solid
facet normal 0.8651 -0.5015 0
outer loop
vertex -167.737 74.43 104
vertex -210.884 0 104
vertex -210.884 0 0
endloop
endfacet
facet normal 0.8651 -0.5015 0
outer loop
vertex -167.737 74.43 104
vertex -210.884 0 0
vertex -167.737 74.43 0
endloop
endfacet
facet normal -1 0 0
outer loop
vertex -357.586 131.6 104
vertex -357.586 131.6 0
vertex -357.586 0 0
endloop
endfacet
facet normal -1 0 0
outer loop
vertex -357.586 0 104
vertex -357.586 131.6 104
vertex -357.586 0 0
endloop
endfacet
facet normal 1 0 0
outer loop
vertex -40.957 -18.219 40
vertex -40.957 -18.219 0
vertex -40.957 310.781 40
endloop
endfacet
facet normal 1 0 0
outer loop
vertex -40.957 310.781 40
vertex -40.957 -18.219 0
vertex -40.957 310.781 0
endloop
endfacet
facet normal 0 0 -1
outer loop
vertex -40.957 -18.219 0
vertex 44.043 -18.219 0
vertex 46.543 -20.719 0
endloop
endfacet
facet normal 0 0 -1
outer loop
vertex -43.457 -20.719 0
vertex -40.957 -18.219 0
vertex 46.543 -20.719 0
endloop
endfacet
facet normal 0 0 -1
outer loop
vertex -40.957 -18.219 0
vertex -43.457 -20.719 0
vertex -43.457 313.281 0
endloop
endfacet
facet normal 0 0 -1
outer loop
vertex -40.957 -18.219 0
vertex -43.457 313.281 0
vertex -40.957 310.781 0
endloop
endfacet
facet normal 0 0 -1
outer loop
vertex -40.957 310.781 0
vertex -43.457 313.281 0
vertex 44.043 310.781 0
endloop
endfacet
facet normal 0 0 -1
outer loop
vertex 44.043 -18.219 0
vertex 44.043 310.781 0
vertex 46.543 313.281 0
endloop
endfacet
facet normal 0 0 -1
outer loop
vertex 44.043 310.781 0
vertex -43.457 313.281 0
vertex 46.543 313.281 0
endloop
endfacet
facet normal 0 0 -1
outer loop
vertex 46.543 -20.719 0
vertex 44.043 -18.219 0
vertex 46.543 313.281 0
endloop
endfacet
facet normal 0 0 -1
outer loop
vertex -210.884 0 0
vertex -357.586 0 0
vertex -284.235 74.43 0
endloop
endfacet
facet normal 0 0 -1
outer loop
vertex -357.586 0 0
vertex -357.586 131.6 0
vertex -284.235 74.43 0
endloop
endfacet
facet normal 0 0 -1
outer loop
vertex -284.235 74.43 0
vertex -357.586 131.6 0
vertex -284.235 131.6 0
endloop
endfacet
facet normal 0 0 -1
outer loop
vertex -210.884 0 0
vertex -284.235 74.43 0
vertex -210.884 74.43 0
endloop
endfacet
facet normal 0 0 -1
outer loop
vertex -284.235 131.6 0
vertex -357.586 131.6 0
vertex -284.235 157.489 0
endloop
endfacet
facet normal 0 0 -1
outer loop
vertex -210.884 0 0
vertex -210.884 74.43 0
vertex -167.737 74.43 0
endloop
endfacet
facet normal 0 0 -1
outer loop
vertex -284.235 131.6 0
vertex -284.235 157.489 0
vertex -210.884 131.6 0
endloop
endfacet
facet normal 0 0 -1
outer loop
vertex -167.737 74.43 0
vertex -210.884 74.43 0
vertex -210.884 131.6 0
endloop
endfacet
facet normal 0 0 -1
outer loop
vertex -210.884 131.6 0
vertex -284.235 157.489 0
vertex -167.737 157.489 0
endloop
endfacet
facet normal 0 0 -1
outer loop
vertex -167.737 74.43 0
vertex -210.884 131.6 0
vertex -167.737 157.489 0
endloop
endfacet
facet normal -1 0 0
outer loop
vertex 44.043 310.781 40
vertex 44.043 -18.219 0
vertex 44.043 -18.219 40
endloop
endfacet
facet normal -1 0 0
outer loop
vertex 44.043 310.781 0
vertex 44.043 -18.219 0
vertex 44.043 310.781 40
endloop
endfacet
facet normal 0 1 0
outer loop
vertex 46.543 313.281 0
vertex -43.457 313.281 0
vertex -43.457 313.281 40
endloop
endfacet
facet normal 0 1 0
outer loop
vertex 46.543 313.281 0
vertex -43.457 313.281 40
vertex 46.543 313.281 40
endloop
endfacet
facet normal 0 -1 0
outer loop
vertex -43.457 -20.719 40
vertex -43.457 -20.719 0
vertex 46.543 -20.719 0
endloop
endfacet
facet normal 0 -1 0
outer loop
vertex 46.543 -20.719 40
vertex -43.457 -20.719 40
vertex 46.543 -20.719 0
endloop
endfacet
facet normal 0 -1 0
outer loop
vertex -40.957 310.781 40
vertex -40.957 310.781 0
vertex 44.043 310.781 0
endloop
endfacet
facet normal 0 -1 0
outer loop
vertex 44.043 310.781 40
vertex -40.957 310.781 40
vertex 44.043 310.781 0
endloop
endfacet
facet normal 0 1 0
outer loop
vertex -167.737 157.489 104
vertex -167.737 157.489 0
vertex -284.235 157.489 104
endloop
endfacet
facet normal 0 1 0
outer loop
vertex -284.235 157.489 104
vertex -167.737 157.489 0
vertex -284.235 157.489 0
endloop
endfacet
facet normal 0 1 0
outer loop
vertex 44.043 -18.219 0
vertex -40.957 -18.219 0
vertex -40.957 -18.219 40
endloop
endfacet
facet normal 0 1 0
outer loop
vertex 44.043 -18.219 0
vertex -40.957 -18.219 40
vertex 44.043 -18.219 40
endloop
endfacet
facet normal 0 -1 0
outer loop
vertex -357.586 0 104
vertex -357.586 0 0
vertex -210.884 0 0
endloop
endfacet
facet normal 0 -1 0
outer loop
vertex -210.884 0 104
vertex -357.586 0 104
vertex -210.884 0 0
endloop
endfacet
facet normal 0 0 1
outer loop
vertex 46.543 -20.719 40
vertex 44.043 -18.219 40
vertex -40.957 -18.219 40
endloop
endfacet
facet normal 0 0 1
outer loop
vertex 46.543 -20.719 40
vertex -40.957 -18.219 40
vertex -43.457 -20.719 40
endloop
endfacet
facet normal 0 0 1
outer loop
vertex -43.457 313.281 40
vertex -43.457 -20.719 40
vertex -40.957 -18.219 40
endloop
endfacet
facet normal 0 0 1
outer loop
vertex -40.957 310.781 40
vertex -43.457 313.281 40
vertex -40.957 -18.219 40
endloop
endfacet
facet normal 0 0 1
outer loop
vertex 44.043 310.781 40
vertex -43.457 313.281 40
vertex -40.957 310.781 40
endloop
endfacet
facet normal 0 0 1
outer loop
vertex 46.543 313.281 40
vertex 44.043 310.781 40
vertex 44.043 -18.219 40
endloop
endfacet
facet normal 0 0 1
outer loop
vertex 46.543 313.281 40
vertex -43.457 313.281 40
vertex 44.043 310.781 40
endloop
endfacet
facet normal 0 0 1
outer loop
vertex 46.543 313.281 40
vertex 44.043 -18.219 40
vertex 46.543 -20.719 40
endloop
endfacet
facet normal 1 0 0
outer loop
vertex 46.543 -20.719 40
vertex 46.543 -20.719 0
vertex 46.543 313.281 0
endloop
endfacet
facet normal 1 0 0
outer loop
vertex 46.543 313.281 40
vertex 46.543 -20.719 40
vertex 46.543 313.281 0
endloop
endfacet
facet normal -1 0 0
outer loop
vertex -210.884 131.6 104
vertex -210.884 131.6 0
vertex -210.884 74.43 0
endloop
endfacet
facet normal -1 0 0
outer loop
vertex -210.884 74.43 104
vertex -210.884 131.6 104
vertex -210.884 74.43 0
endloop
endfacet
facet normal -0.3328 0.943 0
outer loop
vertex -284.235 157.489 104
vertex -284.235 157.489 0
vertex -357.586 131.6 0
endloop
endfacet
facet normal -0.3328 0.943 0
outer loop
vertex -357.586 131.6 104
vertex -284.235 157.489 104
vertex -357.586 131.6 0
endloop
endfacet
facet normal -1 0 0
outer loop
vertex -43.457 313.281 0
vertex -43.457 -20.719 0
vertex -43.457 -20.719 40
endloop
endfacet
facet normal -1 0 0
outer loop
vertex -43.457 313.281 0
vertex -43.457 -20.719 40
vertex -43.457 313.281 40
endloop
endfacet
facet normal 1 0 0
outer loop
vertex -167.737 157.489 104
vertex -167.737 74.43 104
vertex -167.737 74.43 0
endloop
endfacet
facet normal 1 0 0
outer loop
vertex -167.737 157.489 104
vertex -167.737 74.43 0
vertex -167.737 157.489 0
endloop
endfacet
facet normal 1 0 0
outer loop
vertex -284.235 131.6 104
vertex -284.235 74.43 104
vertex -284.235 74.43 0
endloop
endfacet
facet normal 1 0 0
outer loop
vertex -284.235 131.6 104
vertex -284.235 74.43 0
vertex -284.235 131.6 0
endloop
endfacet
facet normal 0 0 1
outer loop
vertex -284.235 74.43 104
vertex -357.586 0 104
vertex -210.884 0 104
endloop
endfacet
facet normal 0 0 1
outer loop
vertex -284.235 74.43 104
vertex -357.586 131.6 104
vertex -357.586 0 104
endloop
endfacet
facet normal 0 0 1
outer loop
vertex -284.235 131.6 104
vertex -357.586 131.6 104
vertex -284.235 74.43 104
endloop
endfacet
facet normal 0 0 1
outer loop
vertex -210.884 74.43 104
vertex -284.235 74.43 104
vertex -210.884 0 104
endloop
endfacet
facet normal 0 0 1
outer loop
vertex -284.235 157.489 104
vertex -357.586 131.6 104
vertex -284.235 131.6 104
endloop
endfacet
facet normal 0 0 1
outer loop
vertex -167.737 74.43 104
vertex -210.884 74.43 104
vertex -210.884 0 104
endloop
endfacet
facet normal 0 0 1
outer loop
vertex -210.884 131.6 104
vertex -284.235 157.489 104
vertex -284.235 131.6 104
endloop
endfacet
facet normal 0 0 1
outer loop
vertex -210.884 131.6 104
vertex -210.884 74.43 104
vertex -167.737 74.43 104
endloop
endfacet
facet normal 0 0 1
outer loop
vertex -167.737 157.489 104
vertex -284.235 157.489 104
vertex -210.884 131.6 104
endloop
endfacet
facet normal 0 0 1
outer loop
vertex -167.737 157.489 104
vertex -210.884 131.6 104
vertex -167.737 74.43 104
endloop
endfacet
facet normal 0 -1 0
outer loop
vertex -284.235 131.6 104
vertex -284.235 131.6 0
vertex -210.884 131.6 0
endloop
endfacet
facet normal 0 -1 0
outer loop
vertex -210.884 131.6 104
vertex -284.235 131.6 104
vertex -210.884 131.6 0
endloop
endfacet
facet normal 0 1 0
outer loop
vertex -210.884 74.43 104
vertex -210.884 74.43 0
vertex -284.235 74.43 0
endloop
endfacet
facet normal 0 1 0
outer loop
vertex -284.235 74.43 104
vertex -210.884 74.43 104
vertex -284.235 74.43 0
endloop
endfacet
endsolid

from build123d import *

# Parameters (mm, degrees)
F0_W     = 90
F0_H     = 334
F1_DEPTH = 40
F2_T     = -2.5
F4_DEPTH = 104


with BuildPart() as f1:
    # F0 (on Top) → F1 (new body)
    with BuildSketch(Plane.XY):
        with Locations((1.543468, 146.28129)):
            Rectangle(F0_W, F0_H)
    extrude(amount=F1_DEPTH)

    # F2
    f2_openings = [f1.faces().sort_by_distance(p)[0] for p in [
        (1.543468, 146.28129, 40),
        (1.543468, 146.28129, 0),
    ]]
    offset(amount=F2_T, openings=f2_openings)


with BuildPart() as f4:
    # F3 (on Top) → F4 (new body)
    with BuildSketch(Plane.XY):
        Polygon((-284.235284, 157.489002), (-357.586324, 131.600395), (-284.235284, 131.600395), align=None)
        Polygon((-284.235284, 131.600395), (-357.586324, 131.600395), (-357.586324, 0), (-284.235284, 74.429728), align=None)
        Polygon((-284.235284, 157.489002), (-284.235284, 131.600395), (-210.884243, 131.600395), (-167.73656, 157.489002), align=None)
        Polygon((-284.235284, 74.429728), (-357.586324, 0), (-210.884243, 0), (-210.884243, 74.429728), align=None)
        Polygon((-167.73656, 157.489002), (-210.884243, 131.600395), (-210.884243, 74.429728), (-167.73656, 74.429728), align=None)
        Polygon((-210.884243, 74.429728), (-210.884243, 0), (-167.73656, 74.429728), align=None)
    extrude(amount=F4_DEPTH)


solid = Compound([f1.part, f4.part])
